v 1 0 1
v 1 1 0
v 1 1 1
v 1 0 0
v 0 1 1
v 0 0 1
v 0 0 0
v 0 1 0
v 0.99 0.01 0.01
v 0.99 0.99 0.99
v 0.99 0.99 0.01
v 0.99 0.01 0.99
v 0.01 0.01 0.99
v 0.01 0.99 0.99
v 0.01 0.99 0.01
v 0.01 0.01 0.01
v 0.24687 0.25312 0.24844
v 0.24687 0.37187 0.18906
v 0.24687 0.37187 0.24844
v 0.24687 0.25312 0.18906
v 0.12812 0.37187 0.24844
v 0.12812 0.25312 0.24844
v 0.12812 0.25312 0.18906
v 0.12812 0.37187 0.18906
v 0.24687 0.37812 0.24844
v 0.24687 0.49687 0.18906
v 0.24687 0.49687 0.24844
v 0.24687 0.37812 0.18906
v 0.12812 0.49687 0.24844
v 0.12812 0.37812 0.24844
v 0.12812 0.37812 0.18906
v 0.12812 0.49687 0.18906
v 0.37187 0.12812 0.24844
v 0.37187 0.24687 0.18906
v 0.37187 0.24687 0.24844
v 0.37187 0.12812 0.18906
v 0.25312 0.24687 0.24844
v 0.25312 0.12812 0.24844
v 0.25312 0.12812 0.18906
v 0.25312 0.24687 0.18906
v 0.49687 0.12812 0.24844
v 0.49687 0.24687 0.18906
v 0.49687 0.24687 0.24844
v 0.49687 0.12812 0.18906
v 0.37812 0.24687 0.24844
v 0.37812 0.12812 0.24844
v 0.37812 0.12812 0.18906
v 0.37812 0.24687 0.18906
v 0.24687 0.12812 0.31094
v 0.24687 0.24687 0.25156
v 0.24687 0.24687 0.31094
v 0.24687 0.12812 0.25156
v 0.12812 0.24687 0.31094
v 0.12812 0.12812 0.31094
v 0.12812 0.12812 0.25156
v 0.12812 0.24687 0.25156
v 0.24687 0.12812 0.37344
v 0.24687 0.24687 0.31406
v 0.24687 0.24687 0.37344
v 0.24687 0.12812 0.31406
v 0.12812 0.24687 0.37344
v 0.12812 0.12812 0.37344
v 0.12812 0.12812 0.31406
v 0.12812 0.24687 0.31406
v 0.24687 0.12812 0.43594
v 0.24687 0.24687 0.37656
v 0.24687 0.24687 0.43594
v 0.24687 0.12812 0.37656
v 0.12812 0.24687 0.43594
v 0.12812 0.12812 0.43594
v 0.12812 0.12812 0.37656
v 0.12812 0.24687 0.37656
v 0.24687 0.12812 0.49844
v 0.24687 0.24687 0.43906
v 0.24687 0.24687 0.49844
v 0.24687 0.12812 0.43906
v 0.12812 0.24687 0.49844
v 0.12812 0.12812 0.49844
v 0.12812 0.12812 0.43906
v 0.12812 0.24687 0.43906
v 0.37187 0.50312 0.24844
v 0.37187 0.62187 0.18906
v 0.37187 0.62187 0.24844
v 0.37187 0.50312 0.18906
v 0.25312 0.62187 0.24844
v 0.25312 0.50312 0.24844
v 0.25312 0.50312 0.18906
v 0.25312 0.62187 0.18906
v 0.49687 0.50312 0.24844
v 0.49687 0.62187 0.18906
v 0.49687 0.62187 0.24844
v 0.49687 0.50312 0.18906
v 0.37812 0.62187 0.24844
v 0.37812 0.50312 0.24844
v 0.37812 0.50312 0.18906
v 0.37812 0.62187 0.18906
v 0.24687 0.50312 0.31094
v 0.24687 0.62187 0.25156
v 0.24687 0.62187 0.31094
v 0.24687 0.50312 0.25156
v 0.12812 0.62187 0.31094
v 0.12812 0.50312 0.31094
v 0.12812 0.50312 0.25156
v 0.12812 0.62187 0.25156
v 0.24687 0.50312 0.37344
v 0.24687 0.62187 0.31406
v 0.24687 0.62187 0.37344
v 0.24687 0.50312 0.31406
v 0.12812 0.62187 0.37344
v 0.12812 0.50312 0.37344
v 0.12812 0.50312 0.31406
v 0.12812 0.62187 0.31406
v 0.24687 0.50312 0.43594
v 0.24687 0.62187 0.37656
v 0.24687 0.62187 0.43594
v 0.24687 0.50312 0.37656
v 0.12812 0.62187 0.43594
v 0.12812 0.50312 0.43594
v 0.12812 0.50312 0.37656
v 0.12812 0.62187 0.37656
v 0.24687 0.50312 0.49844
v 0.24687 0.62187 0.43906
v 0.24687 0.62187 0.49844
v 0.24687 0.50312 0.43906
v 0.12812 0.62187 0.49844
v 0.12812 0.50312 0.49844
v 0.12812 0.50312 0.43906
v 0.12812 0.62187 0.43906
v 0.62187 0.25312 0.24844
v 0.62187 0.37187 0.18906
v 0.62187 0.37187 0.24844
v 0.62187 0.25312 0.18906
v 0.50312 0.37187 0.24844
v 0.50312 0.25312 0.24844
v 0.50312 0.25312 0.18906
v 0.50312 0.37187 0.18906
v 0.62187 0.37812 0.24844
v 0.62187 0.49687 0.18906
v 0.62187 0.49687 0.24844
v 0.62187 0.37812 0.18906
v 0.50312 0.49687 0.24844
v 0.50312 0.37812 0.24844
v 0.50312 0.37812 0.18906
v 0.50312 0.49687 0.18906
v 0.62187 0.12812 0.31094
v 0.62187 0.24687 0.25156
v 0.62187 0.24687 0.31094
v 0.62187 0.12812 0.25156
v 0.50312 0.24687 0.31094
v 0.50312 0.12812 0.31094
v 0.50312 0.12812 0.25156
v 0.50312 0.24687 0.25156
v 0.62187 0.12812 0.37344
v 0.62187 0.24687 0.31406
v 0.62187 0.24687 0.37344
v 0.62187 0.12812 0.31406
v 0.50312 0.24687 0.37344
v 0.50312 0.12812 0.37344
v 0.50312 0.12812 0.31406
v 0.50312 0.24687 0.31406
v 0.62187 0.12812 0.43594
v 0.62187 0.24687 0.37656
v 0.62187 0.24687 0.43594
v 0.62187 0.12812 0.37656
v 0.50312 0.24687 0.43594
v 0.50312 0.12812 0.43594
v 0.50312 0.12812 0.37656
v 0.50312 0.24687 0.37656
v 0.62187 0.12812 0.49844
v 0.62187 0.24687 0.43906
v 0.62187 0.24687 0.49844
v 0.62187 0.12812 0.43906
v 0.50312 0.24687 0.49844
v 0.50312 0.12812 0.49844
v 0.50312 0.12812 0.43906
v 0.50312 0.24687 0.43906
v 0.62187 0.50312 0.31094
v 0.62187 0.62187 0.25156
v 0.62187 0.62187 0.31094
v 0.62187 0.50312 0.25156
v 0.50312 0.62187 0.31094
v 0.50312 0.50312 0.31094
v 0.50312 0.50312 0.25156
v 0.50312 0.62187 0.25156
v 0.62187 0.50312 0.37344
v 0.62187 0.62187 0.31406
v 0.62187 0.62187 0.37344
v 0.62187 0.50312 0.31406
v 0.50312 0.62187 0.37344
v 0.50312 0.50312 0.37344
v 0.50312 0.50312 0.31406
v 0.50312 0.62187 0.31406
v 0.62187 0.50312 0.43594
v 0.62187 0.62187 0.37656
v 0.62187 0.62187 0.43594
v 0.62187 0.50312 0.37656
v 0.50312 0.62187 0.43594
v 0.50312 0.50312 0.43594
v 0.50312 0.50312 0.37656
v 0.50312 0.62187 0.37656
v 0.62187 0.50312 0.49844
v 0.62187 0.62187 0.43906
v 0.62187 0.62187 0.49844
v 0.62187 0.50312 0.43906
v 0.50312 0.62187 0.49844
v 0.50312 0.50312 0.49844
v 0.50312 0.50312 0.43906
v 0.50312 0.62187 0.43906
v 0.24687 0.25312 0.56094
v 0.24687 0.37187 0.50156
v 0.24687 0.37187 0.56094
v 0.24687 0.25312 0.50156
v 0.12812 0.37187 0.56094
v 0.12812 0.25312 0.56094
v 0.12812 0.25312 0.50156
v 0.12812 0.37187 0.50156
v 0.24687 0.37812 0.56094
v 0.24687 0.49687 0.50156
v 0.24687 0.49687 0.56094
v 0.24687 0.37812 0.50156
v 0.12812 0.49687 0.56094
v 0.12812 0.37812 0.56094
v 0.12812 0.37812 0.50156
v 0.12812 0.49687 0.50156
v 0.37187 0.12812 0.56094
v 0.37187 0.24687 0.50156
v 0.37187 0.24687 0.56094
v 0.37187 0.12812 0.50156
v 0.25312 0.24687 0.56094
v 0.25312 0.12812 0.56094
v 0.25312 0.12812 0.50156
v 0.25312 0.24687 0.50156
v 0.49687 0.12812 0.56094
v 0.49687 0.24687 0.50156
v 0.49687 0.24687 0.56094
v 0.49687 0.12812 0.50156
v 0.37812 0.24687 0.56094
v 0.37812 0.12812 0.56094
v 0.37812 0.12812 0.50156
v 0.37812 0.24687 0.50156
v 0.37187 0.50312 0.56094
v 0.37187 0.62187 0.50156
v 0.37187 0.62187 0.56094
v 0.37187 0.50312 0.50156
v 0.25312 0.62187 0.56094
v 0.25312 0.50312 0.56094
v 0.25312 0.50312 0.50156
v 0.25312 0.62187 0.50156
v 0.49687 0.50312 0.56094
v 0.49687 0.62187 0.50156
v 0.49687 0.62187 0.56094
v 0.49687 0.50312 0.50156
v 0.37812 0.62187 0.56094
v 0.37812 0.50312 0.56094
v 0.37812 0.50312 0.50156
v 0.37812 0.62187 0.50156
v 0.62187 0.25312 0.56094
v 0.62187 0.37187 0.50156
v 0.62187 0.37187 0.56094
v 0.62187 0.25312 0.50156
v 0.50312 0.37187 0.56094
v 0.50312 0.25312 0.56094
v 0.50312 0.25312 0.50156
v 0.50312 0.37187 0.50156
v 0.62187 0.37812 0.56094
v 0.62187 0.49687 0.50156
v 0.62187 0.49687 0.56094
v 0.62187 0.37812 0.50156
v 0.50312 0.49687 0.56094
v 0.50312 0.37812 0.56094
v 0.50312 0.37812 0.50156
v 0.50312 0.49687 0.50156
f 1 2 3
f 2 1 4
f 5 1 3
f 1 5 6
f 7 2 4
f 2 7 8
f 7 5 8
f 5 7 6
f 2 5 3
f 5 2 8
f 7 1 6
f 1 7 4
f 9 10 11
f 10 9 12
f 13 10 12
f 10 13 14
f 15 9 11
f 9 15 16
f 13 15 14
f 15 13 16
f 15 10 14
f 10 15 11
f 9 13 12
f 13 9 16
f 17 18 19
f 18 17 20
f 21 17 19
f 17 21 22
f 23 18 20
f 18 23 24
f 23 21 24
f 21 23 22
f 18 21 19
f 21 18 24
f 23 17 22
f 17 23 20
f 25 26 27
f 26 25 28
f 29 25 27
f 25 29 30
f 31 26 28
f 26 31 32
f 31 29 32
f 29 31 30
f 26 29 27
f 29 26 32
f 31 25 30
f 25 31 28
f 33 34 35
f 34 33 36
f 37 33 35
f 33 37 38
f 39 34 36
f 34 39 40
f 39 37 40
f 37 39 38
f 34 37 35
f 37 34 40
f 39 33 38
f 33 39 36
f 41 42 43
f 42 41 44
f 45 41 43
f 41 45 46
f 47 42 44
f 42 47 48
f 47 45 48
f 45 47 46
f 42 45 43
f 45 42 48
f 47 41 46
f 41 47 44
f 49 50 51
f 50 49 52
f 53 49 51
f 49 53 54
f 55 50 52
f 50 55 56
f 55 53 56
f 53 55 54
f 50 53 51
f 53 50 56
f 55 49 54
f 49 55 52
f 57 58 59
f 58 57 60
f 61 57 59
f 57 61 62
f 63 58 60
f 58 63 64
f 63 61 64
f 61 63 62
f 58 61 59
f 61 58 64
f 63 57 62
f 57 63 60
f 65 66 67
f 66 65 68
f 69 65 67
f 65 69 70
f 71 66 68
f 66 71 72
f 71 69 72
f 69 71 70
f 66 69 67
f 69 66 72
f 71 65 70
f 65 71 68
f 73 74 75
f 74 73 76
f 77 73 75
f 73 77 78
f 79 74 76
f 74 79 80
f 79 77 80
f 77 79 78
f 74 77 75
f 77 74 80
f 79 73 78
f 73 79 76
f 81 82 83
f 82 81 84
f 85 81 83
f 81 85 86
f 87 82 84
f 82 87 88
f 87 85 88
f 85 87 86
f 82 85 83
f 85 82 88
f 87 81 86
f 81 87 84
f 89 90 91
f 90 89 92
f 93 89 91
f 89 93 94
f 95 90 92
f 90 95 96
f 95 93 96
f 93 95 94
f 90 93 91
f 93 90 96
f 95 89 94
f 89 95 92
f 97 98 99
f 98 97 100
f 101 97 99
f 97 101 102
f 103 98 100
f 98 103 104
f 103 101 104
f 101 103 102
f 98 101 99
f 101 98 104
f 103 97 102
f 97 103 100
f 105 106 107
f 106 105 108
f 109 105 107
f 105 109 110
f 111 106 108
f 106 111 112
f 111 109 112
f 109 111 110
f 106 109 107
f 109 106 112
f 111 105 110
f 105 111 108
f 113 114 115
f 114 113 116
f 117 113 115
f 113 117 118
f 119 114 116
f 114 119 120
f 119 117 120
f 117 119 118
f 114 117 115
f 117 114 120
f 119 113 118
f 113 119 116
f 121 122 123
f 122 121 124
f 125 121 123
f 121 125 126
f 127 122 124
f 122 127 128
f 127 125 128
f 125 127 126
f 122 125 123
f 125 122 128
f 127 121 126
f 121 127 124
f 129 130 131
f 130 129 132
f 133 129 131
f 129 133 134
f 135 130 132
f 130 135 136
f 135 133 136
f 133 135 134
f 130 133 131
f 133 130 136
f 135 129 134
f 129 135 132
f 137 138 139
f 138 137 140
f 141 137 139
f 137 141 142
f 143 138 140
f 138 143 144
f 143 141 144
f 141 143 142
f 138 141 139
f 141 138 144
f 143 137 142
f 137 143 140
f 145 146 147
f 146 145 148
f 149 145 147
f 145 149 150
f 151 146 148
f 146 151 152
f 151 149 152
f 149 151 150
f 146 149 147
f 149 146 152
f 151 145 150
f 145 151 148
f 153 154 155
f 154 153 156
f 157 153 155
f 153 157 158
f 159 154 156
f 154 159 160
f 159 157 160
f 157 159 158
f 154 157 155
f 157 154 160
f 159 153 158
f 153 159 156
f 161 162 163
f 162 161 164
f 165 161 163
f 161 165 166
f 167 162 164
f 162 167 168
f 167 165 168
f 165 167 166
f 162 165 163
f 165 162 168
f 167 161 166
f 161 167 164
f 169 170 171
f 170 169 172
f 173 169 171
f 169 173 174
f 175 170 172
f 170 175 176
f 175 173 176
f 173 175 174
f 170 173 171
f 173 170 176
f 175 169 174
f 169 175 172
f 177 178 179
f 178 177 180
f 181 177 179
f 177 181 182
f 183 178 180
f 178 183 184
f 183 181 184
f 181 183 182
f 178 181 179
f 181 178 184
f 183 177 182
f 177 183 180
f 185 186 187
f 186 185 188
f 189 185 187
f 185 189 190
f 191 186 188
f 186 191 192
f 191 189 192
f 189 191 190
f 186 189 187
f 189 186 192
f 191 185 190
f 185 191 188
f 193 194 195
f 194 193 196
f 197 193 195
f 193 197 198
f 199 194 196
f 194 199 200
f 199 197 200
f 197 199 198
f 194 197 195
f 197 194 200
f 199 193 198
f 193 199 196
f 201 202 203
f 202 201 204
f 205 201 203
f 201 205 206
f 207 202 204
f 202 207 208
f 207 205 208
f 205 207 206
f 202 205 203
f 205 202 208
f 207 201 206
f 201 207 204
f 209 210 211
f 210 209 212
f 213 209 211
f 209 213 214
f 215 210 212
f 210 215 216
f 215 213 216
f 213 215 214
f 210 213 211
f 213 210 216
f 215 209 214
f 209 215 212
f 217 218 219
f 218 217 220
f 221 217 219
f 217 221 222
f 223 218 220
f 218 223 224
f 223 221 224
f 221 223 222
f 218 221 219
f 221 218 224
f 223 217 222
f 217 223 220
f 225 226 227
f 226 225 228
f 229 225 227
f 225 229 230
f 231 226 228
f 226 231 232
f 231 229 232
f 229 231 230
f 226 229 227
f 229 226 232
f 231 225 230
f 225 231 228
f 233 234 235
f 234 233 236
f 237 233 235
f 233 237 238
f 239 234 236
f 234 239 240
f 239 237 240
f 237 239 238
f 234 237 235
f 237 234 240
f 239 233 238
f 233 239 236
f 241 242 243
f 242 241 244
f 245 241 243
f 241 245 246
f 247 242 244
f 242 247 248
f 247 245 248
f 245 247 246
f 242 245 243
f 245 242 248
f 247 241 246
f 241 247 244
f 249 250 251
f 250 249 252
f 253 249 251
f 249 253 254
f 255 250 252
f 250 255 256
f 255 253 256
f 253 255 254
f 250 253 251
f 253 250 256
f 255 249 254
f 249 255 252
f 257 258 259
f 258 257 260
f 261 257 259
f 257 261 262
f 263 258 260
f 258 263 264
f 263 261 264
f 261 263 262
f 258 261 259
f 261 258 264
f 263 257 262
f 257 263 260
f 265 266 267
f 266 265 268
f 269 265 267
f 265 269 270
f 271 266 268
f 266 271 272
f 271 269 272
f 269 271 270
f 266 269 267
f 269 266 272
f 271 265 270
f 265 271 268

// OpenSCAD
translate([0.1875, 0.3125, 0.21875]) color([0.3723307592388937, 0.2687975496070053, 0.5431010148318319]) cube([0.11875, 0.11875, 0.059375], center=true);
translate([0.1875, 0.4375, 0.21875]) color([0.3390737213020516, 0.4953995731584907, 0.47426568178825046]) cube([0.11875, 0.11875, 0.059375], center=true);
translate([0.3125, 0.1875, 0.21875]) color([0.7813281014383978, 0.7049040060844236, 0.6672020242354549]) cube([0.11875, 0.11875, 0.059375], center=true);
translate([0.4375, 0.1875, 0.21875]) color([0.59891321162433, 0.20675941547323395, 0.4989320496811215]) cube([0.11875, 0.11875, 0.059375], center=true);
translate([0.1875, 0.1875, 0.28125]) color([0.15860592767823745, 0.24362692220537363, 0.9223470492400727]) cube([0.11875, 0.11875, 0.059375], center=true);
translate([0.1875, 0.1875, 0.34375]) color([0.08125028632768871, 0.08778967306208207, 0.1566294178982881]) cube([0.11875, 0.11875, 0.059375], center=true);
translate([0.1875, 0.1875, 0.40625]) color([0.4881466097258217, 0.9394993485091689, 0.09483007936046162]) cube([0.11875, 0.11875, 0.059375], center=true);
translate([0.1875, 0.1875, 0.46875]) color([0.7496523094784379, 0.698979968590827, 0.8137974970319007]) cube([0.11875, 0.11875, 0.059375], center=true);
translate([0.3125, 0.5625, 0.21875]) color([0.2900989154375855, 0.4799983707352583, 0.7775393964930869]) cube([0.11875, 0.11875, 0.059375], center=true);
translate([0.4375, 0.5625, 0.21875]) color([0.9388082122897282, 0.038854283444424764, 0.9925655674013534]) cube([0.11875, 0.11875, 0.059375], center=true);
translate([0.1875, 0.5625, 0.28125]) color([0.44170260534215255, 0.5087868714146372, 0.3598719796518973]) cube([0.11875, 0.11875, 0.059375], center=true);
translate([0.1875, 0.5625, 0.34375]) color([0.18460354523301148, 0.44970120413659875, 0.6501993296624843]) cube([0.11875, 0.11875, 0.059375], center=true);
translate([0.1875, 0.5625, 0.40625]) color([0.3403487699834433, 0.7817731397512809, 0.9743292711922114]) cube([0.11875, 0.11875, 0.059375], center=true);
translate([0.1875, 0.5625, 0.46875]) color([0.5879067123776442, 0.7644126763156446, 0.4000601250473008]) cube([0.11875, 0.11875, 0.059375], center=true);
translate([0.5625, 0.3125, 0.21875]) color([0.36604355066630223, 0.49574653220142006, 0.2571489256046471]) cube([0.11875, 0.11875, 0.059375], center=true);
translate([0.5625, 0.4375, 0.21875]) color([0.8374632643388946, 0.9805052880896761, 0.7293080884755028]) cube([0.11875, 0.11875, 0.059375], center=true);
translate([0.5625, 0.1875, 0.28125]) color([0.7102462781470706, 0.33116367429719706, 0.8694016796882821]) cube([0.11875, 0.11875, 0.059375], center=true);
translate([0.5625, 0.1875, 0.34375]) color([0.15926942089300955, 0.6020328264740608, 0.3939291367673188]) cube([0.11875, 0.11875, 0.059375], center=true);
translate([0.5625, 0.1875, 0.40625]) color([0.17107948370632353, 0.5511468417605202, 0.6362547263976265]) cube([0.11875, 0.11875, 0.059375], center=true);
translate([0.5625, 0.1875, 0.46875]) color([0.4513488113702364, 0.4273913195858777, 0.7941595965619336]) cube([0.11875, 0.11875, 0.059375], center=true);
translate([0.5625, 0.5625, 0.28125]) color([0.250259319804494, 0.668466334841109, 0.9558425975622227]) cube([0.11875, 0.11875, 0.059375], center=true);
translate([0.5625, 0.5625, 0.34375]) color([0.8787840809996866, 0.7297949922477387, 0.6760701789099856]) cube([0.11875, 0.11875, 0.059375], center=true);
translate([0.5625, 0.5625, 0.40625]) color([0.12178286062576871, 0.34347709882143906, 0.3138882056823582]) cube([0.11875, 0.11875, 0.059375], center=true);
translate([0.5625, 0.5625, 0.46875]) color([0.8256958180770725, 0.5497988063064695, 0.5224418814286286]) cube([0.11875, 0.11875, 0.059375], center=true);
translate([0.1875, 0.3125, 0.53125]) color([0.8667571418796679, 0.1657379622209173, 0.34152302129198175]) cube([0.11875, 0.11875, 0.059375], center=true);
translate([0.1875, 0.4375, 0.53125]) color([0.4966795782970417, 0.4682540107735893, 0.7143441099210599]) cube([0.11875, 0.11875, 0.059375], center=true);
translate([0.3125, 0.1875, 0.53125]) color([0.6794769624286241, 0.9778011538649698, 0.6956985505223239]) cube([0.11875, 0.11875, 0.059375], center=true);
translate([0.4375, 0.1875, 0.53125]) color([0.049848449837082254, 0.7040255102812552, 0.23502660225710548]) cube([0.11875, 0.11875, 0.059375], center=true);
translate([0.3125, 0.5625, 0.53125]) color([0.2192232268137776, 0.25394565558833193, 0.7470066807227207]) cube([0.11875, 0.11875, 0.059375], center=true);
translate([0.4375, 0.5625, 0.53125]) color([0.4970273434949305, 0.6457861570741659, 0.6123610041545314]) cube([0.11875, 0.11875, 0.059375], center=true);
translate([0.5625, 0.3125, 0.53125]) color([0.3147608560008942, 0.21779972321877228, 0.08573673877399712]) cube([0.11875, 0.11875, 0.059375], center=true);
translate([0.5625, 0.4375, 0.53125]) color([0.7301345985439462, 0.012122804887951477, 0.9266572233595807]) cube([0.11875, 0.11875, 0.059375], center=true);
color([0.3,0.3,0.3,0.3]) difference() { cube([1,1,1]); translate([0.01,0.01,0.01]) cube([0.98,0.98,0.98]); }
